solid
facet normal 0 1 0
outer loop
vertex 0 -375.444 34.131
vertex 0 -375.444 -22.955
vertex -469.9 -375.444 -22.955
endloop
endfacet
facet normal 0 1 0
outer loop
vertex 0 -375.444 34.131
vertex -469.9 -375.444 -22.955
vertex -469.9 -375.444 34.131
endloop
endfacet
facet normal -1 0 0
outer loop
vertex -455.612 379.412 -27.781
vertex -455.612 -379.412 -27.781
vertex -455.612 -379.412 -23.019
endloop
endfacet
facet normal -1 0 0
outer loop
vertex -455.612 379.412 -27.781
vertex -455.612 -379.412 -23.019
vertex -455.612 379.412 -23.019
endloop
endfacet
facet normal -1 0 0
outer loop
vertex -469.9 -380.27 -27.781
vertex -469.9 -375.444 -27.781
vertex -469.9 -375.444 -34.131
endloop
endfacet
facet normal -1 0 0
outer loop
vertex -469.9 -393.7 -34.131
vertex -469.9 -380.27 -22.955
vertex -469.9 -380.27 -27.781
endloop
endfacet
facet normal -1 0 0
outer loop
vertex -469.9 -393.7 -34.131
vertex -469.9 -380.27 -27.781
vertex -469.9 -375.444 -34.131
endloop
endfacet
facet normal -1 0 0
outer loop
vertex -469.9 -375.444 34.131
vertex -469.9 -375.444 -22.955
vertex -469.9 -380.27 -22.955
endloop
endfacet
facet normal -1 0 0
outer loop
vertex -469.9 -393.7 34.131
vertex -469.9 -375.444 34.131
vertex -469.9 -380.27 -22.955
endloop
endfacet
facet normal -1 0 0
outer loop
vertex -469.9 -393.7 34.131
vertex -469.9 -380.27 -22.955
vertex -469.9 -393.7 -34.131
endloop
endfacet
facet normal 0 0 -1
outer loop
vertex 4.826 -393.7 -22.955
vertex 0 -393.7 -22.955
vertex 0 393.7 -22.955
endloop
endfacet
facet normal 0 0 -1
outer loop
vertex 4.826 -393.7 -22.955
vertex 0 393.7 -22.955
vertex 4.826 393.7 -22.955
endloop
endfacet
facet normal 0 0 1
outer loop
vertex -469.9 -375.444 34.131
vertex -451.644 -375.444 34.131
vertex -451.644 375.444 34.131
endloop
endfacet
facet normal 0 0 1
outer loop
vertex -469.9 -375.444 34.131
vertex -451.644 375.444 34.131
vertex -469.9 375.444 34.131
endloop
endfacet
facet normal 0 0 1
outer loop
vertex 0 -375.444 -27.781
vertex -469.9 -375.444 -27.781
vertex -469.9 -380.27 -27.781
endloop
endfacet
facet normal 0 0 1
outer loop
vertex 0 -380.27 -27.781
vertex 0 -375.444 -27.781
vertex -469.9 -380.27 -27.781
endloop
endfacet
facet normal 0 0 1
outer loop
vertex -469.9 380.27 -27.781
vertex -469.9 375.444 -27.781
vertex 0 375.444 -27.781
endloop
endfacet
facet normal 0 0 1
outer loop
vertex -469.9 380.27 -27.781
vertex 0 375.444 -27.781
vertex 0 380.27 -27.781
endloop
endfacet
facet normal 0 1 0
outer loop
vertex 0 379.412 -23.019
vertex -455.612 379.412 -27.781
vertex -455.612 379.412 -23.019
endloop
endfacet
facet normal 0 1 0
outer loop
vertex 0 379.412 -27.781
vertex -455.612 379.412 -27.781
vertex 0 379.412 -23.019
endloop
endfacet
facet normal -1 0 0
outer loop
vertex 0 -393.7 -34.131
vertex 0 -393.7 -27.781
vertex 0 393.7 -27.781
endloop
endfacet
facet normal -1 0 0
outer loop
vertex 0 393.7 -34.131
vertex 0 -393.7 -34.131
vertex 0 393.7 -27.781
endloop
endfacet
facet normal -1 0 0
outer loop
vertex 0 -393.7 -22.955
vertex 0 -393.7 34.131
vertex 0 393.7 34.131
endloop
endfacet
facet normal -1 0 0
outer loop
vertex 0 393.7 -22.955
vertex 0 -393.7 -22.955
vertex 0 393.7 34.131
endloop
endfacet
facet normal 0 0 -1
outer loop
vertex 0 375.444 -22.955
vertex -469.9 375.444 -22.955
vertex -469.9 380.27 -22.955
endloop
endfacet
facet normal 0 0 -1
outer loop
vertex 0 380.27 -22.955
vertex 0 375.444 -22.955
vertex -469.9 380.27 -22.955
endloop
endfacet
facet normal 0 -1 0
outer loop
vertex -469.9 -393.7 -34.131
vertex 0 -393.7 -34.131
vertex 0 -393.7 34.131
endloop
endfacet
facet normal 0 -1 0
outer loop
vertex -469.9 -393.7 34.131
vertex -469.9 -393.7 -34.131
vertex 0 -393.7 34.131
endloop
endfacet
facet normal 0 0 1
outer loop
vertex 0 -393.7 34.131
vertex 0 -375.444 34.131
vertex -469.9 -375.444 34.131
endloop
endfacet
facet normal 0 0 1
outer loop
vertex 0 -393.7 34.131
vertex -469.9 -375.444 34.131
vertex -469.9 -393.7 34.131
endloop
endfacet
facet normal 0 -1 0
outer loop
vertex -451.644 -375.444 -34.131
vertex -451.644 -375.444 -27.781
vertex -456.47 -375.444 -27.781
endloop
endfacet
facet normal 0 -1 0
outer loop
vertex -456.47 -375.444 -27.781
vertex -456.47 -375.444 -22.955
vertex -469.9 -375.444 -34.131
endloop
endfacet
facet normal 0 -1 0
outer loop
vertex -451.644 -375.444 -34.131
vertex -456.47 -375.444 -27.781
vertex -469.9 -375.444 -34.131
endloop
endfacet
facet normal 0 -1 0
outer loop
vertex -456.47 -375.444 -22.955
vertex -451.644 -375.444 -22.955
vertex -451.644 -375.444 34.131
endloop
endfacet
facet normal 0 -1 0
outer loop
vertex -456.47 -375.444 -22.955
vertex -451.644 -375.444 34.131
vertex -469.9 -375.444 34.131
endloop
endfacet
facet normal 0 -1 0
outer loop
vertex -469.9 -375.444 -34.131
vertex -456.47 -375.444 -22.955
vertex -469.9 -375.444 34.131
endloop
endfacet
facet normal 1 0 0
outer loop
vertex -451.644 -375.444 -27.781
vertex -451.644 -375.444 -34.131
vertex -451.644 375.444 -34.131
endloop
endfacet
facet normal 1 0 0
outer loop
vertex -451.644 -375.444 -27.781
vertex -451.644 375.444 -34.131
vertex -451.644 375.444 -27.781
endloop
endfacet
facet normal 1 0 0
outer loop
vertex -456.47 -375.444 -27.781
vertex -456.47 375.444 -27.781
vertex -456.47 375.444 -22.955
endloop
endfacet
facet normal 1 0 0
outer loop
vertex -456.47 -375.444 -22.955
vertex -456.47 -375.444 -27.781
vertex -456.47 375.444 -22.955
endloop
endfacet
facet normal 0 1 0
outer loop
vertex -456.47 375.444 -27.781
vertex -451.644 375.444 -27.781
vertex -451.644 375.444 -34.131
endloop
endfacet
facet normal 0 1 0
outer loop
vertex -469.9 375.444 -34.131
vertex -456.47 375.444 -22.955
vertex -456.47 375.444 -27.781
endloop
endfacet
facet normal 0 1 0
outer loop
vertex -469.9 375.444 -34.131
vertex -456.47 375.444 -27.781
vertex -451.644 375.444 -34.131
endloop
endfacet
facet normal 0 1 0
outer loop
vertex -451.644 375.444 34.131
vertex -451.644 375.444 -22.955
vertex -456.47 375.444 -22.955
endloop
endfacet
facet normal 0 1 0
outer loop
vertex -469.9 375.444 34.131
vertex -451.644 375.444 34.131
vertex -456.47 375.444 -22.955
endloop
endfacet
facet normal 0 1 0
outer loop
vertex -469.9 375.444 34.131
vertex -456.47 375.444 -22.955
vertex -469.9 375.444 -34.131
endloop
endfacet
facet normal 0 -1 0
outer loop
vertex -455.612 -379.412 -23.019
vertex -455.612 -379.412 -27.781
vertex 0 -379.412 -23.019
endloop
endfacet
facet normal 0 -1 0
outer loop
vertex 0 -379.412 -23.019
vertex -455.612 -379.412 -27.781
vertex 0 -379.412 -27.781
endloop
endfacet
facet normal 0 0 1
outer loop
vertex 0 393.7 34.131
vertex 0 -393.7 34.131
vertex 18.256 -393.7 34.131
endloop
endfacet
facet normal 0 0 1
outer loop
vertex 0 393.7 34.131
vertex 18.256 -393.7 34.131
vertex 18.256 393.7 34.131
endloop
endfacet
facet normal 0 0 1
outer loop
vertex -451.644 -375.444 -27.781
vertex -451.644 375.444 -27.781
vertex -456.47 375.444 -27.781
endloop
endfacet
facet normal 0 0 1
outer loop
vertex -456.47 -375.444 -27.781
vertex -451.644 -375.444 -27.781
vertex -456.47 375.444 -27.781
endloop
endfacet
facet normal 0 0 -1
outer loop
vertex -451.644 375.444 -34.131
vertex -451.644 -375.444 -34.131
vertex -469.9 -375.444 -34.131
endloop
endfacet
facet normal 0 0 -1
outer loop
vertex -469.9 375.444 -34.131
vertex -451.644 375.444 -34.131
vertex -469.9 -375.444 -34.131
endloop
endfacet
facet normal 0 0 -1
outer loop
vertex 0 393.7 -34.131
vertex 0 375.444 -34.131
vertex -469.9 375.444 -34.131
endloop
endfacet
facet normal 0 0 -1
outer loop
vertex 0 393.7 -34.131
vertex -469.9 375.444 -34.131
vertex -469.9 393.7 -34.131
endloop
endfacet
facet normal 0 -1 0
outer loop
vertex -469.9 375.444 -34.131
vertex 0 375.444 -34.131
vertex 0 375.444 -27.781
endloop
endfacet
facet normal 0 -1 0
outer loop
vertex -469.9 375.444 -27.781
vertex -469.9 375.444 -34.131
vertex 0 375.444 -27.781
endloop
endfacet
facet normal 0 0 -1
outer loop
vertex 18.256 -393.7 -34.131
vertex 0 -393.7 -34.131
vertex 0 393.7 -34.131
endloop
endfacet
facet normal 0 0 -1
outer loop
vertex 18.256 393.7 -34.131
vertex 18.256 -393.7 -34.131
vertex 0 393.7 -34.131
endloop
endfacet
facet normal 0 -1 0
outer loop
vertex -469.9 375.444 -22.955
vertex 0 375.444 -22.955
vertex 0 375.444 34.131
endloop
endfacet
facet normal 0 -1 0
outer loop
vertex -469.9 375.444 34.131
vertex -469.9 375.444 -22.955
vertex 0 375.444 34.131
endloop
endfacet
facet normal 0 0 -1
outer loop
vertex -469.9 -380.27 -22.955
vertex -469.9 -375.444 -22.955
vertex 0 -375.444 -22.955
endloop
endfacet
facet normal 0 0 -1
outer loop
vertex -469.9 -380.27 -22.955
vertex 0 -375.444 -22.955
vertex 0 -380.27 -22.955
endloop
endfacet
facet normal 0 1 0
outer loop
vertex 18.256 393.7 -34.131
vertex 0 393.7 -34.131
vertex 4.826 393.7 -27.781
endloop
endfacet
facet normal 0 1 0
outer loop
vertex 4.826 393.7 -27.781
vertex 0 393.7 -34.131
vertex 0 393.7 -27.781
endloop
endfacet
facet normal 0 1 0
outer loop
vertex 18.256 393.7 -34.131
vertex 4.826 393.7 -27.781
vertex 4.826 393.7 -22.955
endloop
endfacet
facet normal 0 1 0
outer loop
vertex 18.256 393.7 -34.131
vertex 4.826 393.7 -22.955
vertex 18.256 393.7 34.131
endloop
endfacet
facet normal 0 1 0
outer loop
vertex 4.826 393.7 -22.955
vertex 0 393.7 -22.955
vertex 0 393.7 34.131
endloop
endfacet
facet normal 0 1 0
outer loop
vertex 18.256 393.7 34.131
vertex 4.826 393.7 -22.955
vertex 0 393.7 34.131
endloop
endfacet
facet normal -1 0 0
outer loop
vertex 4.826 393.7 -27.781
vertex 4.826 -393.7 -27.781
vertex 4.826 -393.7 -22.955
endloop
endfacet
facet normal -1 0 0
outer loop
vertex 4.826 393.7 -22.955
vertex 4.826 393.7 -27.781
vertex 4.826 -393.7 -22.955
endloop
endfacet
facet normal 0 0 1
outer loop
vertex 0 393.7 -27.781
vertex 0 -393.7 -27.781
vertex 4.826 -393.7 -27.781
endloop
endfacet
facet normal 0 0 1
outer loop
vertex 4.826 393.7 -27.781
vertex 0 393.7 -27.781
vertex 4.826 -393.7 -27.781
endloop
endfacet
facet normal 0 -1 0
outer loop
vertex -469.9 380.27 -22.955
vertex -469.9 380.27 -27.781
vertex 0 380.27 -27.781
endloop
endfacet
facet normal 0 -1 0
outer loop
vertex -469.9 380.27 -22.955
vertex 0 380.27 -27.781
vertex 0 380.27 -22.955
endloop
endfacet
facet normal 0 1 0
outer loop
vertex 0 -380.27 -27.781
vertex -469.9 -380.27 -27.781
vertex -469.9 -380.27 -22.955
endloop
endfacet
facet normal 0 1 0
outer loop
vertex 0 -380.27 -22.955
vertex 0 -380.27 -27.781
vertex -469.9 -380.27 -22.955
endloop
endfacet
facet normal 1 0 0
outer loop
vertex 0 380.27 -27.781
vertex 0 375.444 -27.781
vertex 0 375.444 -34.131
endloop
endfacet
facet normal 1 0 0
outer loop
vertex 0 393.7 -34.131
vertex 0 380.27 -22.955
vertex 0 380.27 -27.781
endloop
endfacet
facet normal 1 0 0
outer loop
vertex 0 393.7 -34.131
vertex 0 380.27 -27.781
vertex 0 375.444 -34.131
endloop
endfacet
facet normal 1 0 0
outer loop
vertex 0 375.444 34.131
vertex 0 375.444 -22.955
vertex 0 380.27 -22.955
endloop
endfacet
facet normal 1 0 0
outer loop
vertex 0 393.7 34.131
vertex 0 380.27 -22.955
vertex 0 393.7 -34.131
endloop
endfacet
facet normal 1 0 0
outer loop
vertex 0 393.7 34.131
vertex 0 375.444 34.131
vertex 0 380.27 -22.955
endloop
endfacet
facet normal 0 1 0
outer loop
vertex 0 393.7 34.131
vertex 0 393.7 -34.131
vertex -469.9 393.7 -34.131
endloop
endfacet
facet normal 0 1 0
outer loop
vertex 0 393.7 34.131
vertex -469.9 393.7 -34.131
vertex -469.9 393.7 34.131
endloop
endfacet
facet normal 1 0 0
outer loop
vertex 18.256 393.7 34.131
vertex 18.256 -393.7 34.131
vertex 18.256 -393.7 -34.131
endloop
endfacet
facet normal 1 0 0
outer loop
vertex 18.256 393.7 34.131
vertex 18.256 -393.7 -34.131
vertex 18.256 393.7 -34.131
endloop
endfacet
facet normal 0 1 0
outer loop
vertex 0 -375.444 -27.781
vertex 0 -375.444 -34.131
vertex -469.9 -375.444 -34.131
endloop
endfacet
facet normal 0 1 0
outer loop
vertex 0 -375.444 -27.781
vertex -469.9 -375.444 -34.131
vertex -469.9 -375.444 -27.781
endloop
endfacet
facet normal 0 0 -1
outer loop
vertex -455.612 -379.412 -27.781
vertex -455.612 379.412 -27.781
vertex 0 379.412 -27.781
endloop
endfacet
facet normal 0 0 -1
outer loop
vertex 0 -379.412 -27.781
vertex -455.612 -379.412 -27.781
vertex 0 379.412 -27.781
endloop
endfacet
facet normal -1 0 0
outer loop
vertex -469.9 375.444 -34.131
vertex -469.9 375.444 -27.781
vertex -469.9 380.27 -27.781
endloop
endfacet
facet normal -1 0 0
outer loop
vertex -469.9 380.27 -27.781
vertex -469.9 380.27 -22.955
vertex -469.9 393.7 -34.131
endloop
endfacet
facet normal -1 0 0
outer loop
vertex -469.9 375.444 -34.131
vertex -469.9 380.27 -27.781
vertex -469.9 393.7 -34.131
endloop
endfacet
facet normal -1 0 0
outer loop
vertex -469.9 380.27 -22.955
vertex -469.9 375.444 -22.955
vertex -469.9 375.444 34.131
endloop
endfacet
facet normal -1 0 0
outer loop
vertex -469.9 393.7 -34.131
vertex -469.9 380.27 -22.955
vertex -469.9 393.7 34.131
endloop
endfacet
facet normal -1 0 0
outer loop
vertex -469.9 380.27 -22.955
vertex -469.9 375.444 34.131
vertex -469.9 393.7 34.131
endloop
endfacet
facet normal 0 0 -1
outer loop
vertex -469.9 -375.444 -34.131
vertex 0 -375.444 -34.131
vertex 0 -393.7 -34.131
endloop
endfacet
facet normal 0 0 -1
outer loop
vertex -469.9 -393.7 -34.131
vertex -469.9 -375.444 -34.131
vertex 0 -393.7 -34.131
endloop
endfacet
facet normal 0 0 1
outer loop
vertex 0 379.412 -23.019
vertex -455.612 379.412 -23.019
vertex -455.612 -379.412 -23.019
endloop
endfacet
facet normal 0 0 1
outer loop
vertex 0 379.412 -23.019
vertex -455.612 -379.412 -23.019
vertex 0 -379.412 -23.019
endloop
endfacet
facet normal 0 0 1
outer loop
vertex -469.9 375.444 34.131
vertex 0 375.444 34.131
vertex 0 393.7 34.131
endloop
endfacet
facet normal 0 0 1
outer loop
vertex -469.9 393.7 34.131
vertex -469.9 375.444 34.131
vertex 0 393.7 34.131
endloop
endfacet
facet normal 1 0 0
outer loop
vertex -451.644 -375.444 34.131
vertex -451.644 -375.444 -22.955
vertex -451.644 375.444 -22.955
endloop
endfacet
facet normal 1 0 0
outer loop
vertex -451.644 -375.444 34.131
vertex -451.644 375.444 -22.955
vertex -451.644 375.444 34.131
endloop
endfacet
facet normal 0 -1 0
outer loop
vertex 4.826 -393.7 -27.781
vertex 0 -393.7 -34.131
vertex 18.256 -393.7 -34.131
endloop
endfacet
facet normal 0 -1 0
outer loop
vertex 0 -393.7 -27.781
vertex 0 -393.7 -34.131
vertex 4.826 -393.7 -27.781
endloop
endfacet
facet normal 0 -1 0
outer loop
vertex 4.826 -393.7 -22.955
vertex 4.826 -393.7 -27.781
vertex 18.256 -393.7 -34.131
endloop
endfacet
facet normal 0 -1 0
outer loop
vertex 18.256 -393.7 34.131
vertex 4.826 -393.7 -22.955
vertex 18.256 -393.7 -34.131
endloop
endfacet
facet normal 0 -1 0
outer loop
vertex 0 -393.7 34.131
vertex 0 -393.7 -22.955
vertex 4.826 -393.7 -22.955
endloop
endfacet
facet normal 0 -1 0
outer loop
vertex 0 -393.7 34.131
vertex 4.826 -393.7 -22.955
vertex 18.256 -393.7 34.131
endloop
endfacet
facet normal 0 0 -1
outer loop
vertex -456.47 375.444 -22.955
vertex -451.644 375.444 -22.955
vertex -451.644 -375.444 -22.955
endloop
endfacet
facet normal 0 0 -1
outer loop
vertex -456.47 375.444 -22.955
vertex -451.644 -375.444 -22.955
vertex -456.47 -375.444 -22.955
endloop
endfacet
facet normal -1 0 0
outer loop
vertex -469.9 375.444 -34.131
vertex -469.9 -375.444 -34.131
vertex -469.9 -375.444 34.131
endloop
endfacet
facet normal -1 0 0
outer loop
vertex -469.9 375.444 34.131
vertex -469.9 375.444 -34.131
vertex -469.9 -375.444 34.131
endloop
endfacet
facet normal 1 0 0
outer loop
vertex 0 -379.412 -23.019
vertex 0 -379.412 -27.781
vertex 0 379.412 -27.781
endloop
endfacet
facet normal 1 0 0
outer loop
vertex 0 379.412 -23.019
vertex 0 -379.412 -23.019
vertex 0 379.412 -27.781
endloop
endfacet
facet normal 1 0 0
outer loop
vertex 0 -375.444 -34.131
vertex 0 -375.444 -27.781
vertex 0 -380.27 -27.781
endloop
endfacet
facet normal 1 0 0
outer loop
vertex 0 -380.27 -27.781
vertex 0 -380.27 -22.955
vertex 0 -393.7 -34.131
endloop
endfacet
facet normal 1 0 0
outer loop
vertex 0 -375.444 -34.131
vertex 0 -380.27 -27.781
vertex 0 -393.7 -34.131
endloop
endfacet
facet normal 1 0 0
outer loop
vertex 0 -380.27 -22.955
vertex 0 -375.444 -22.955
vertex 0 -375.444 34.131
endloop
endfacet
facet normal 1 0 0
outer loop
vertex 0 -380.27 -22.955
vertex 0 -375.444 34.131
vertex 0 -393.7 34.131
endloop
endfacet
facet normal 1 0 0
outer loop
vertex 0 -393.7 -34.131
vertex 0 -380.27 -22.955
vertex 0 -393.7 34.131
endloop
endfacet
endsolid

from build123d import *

# Parameters (mm, degrees)
F0_W      = 787.4
F0_H      = 68.2625
F1_DEPTH  = 18.25625
F2_W      = 18.25625
F2_H      = 68.2625
F3_DEPTH  = 469.9
F4_W      = 4.826
F4_H      = 4.826
F5_DEPTH  = 787.401
F6_W      = 4.826
F6_H      = 4.826
F7_DEPTH  = 469.9
F9_W      = 18.25625
F9_H      = 68.2625
F10_DEPTH = 750.8875
F11_W     = 4.826
F11_H     = 4.826
F12_DEPTH = 750.8875
F13_W     = 455.6125
F13_H     = 758.825
F14_DEPTH = 4.7625


with BuildPart() as f1:
    # F0 (on Right) → F1 (new body)
    with BuildSketch(Plane.YZ):
        Rectangle(F0_W, F0_H)
    extrude(amount=F1_DEPTH)

    # F4 (on face) → F5 (cut, through all)
    with BuildSketch(Plane.XZ.offset(393.7)):
        with Locations((2.413, -25.36825)):
            Rectangle(F4_W, F4_H)
    extrude(amount=-F5_DEPTH, mode=Mode.SUBTRACT)


with BuildPart() as f3:
    # F2 (on face) → F3 (new body)
    with BuildSketch(Plane(origin=(0, 0, 0), x_dir=(0, -1, 0), z_dir=(-1, 0, 0))):
        with Locations((384.571875, 0)):
            Rectangle(F2_W, F2_H)
    extrude(amount=F3_DEPTH)

    # F6 (on face) → F7 (cut, through all)
    with BuildSketch(Plane(origin=(-469.9, 0, 0), x_dir=(0, -1, 0), z_dir=(-1, 0, 0))):
        with Locations((377.85675, -25.36825)):
            Rectangle(F6_W, F6_H)
    extrude(amount=-F7_DEPTH, mode=Mode.SUBTRACT)


with BuildPart() as f8_1:
    # F8: instance of F3
    add(f3.part.mirror(Plane.XZ))


with BuildPart() as f10:
    # F9 (on face) → F10 (new body, through all)
    with BuildSketch(Plane(origin=(0, -375.44375, 0), x_dir=(-1, 0, 0), z_dir=(0, 1, 0))):
        with Locations((460.771875, 0)):
            Rectangle(F9_W, F9_H)
    extrude(amount=F10_DEPTH)

    # F11 (on face) → F12 (cut, through all)
    with BuildSketch(Plane(origin=(0, 375.44375, 0), x_dir=(-1, 0, 0), z_dir=(0, 1, 0))):
        with Locations((454.05675, -25.36825)):
            Rectangle(F11_W, F11_H)
    extrude(amount=-F12_DEPTH, mode=Mode.SUBTRACT)


with BuildPart() as f14:
    # F13 (on face) → F14 (new body)
    with BuildSketch(Plane.XY.offset(-27.78125)):
        with Locations((-227.80625, 0)):
            Rectangle(F13_W, F13_H)
    extrude(amount=F14_DEPTH)


solid = Compound([f1.part, f3.part, f8_1.part, f10.part, f14.part])
